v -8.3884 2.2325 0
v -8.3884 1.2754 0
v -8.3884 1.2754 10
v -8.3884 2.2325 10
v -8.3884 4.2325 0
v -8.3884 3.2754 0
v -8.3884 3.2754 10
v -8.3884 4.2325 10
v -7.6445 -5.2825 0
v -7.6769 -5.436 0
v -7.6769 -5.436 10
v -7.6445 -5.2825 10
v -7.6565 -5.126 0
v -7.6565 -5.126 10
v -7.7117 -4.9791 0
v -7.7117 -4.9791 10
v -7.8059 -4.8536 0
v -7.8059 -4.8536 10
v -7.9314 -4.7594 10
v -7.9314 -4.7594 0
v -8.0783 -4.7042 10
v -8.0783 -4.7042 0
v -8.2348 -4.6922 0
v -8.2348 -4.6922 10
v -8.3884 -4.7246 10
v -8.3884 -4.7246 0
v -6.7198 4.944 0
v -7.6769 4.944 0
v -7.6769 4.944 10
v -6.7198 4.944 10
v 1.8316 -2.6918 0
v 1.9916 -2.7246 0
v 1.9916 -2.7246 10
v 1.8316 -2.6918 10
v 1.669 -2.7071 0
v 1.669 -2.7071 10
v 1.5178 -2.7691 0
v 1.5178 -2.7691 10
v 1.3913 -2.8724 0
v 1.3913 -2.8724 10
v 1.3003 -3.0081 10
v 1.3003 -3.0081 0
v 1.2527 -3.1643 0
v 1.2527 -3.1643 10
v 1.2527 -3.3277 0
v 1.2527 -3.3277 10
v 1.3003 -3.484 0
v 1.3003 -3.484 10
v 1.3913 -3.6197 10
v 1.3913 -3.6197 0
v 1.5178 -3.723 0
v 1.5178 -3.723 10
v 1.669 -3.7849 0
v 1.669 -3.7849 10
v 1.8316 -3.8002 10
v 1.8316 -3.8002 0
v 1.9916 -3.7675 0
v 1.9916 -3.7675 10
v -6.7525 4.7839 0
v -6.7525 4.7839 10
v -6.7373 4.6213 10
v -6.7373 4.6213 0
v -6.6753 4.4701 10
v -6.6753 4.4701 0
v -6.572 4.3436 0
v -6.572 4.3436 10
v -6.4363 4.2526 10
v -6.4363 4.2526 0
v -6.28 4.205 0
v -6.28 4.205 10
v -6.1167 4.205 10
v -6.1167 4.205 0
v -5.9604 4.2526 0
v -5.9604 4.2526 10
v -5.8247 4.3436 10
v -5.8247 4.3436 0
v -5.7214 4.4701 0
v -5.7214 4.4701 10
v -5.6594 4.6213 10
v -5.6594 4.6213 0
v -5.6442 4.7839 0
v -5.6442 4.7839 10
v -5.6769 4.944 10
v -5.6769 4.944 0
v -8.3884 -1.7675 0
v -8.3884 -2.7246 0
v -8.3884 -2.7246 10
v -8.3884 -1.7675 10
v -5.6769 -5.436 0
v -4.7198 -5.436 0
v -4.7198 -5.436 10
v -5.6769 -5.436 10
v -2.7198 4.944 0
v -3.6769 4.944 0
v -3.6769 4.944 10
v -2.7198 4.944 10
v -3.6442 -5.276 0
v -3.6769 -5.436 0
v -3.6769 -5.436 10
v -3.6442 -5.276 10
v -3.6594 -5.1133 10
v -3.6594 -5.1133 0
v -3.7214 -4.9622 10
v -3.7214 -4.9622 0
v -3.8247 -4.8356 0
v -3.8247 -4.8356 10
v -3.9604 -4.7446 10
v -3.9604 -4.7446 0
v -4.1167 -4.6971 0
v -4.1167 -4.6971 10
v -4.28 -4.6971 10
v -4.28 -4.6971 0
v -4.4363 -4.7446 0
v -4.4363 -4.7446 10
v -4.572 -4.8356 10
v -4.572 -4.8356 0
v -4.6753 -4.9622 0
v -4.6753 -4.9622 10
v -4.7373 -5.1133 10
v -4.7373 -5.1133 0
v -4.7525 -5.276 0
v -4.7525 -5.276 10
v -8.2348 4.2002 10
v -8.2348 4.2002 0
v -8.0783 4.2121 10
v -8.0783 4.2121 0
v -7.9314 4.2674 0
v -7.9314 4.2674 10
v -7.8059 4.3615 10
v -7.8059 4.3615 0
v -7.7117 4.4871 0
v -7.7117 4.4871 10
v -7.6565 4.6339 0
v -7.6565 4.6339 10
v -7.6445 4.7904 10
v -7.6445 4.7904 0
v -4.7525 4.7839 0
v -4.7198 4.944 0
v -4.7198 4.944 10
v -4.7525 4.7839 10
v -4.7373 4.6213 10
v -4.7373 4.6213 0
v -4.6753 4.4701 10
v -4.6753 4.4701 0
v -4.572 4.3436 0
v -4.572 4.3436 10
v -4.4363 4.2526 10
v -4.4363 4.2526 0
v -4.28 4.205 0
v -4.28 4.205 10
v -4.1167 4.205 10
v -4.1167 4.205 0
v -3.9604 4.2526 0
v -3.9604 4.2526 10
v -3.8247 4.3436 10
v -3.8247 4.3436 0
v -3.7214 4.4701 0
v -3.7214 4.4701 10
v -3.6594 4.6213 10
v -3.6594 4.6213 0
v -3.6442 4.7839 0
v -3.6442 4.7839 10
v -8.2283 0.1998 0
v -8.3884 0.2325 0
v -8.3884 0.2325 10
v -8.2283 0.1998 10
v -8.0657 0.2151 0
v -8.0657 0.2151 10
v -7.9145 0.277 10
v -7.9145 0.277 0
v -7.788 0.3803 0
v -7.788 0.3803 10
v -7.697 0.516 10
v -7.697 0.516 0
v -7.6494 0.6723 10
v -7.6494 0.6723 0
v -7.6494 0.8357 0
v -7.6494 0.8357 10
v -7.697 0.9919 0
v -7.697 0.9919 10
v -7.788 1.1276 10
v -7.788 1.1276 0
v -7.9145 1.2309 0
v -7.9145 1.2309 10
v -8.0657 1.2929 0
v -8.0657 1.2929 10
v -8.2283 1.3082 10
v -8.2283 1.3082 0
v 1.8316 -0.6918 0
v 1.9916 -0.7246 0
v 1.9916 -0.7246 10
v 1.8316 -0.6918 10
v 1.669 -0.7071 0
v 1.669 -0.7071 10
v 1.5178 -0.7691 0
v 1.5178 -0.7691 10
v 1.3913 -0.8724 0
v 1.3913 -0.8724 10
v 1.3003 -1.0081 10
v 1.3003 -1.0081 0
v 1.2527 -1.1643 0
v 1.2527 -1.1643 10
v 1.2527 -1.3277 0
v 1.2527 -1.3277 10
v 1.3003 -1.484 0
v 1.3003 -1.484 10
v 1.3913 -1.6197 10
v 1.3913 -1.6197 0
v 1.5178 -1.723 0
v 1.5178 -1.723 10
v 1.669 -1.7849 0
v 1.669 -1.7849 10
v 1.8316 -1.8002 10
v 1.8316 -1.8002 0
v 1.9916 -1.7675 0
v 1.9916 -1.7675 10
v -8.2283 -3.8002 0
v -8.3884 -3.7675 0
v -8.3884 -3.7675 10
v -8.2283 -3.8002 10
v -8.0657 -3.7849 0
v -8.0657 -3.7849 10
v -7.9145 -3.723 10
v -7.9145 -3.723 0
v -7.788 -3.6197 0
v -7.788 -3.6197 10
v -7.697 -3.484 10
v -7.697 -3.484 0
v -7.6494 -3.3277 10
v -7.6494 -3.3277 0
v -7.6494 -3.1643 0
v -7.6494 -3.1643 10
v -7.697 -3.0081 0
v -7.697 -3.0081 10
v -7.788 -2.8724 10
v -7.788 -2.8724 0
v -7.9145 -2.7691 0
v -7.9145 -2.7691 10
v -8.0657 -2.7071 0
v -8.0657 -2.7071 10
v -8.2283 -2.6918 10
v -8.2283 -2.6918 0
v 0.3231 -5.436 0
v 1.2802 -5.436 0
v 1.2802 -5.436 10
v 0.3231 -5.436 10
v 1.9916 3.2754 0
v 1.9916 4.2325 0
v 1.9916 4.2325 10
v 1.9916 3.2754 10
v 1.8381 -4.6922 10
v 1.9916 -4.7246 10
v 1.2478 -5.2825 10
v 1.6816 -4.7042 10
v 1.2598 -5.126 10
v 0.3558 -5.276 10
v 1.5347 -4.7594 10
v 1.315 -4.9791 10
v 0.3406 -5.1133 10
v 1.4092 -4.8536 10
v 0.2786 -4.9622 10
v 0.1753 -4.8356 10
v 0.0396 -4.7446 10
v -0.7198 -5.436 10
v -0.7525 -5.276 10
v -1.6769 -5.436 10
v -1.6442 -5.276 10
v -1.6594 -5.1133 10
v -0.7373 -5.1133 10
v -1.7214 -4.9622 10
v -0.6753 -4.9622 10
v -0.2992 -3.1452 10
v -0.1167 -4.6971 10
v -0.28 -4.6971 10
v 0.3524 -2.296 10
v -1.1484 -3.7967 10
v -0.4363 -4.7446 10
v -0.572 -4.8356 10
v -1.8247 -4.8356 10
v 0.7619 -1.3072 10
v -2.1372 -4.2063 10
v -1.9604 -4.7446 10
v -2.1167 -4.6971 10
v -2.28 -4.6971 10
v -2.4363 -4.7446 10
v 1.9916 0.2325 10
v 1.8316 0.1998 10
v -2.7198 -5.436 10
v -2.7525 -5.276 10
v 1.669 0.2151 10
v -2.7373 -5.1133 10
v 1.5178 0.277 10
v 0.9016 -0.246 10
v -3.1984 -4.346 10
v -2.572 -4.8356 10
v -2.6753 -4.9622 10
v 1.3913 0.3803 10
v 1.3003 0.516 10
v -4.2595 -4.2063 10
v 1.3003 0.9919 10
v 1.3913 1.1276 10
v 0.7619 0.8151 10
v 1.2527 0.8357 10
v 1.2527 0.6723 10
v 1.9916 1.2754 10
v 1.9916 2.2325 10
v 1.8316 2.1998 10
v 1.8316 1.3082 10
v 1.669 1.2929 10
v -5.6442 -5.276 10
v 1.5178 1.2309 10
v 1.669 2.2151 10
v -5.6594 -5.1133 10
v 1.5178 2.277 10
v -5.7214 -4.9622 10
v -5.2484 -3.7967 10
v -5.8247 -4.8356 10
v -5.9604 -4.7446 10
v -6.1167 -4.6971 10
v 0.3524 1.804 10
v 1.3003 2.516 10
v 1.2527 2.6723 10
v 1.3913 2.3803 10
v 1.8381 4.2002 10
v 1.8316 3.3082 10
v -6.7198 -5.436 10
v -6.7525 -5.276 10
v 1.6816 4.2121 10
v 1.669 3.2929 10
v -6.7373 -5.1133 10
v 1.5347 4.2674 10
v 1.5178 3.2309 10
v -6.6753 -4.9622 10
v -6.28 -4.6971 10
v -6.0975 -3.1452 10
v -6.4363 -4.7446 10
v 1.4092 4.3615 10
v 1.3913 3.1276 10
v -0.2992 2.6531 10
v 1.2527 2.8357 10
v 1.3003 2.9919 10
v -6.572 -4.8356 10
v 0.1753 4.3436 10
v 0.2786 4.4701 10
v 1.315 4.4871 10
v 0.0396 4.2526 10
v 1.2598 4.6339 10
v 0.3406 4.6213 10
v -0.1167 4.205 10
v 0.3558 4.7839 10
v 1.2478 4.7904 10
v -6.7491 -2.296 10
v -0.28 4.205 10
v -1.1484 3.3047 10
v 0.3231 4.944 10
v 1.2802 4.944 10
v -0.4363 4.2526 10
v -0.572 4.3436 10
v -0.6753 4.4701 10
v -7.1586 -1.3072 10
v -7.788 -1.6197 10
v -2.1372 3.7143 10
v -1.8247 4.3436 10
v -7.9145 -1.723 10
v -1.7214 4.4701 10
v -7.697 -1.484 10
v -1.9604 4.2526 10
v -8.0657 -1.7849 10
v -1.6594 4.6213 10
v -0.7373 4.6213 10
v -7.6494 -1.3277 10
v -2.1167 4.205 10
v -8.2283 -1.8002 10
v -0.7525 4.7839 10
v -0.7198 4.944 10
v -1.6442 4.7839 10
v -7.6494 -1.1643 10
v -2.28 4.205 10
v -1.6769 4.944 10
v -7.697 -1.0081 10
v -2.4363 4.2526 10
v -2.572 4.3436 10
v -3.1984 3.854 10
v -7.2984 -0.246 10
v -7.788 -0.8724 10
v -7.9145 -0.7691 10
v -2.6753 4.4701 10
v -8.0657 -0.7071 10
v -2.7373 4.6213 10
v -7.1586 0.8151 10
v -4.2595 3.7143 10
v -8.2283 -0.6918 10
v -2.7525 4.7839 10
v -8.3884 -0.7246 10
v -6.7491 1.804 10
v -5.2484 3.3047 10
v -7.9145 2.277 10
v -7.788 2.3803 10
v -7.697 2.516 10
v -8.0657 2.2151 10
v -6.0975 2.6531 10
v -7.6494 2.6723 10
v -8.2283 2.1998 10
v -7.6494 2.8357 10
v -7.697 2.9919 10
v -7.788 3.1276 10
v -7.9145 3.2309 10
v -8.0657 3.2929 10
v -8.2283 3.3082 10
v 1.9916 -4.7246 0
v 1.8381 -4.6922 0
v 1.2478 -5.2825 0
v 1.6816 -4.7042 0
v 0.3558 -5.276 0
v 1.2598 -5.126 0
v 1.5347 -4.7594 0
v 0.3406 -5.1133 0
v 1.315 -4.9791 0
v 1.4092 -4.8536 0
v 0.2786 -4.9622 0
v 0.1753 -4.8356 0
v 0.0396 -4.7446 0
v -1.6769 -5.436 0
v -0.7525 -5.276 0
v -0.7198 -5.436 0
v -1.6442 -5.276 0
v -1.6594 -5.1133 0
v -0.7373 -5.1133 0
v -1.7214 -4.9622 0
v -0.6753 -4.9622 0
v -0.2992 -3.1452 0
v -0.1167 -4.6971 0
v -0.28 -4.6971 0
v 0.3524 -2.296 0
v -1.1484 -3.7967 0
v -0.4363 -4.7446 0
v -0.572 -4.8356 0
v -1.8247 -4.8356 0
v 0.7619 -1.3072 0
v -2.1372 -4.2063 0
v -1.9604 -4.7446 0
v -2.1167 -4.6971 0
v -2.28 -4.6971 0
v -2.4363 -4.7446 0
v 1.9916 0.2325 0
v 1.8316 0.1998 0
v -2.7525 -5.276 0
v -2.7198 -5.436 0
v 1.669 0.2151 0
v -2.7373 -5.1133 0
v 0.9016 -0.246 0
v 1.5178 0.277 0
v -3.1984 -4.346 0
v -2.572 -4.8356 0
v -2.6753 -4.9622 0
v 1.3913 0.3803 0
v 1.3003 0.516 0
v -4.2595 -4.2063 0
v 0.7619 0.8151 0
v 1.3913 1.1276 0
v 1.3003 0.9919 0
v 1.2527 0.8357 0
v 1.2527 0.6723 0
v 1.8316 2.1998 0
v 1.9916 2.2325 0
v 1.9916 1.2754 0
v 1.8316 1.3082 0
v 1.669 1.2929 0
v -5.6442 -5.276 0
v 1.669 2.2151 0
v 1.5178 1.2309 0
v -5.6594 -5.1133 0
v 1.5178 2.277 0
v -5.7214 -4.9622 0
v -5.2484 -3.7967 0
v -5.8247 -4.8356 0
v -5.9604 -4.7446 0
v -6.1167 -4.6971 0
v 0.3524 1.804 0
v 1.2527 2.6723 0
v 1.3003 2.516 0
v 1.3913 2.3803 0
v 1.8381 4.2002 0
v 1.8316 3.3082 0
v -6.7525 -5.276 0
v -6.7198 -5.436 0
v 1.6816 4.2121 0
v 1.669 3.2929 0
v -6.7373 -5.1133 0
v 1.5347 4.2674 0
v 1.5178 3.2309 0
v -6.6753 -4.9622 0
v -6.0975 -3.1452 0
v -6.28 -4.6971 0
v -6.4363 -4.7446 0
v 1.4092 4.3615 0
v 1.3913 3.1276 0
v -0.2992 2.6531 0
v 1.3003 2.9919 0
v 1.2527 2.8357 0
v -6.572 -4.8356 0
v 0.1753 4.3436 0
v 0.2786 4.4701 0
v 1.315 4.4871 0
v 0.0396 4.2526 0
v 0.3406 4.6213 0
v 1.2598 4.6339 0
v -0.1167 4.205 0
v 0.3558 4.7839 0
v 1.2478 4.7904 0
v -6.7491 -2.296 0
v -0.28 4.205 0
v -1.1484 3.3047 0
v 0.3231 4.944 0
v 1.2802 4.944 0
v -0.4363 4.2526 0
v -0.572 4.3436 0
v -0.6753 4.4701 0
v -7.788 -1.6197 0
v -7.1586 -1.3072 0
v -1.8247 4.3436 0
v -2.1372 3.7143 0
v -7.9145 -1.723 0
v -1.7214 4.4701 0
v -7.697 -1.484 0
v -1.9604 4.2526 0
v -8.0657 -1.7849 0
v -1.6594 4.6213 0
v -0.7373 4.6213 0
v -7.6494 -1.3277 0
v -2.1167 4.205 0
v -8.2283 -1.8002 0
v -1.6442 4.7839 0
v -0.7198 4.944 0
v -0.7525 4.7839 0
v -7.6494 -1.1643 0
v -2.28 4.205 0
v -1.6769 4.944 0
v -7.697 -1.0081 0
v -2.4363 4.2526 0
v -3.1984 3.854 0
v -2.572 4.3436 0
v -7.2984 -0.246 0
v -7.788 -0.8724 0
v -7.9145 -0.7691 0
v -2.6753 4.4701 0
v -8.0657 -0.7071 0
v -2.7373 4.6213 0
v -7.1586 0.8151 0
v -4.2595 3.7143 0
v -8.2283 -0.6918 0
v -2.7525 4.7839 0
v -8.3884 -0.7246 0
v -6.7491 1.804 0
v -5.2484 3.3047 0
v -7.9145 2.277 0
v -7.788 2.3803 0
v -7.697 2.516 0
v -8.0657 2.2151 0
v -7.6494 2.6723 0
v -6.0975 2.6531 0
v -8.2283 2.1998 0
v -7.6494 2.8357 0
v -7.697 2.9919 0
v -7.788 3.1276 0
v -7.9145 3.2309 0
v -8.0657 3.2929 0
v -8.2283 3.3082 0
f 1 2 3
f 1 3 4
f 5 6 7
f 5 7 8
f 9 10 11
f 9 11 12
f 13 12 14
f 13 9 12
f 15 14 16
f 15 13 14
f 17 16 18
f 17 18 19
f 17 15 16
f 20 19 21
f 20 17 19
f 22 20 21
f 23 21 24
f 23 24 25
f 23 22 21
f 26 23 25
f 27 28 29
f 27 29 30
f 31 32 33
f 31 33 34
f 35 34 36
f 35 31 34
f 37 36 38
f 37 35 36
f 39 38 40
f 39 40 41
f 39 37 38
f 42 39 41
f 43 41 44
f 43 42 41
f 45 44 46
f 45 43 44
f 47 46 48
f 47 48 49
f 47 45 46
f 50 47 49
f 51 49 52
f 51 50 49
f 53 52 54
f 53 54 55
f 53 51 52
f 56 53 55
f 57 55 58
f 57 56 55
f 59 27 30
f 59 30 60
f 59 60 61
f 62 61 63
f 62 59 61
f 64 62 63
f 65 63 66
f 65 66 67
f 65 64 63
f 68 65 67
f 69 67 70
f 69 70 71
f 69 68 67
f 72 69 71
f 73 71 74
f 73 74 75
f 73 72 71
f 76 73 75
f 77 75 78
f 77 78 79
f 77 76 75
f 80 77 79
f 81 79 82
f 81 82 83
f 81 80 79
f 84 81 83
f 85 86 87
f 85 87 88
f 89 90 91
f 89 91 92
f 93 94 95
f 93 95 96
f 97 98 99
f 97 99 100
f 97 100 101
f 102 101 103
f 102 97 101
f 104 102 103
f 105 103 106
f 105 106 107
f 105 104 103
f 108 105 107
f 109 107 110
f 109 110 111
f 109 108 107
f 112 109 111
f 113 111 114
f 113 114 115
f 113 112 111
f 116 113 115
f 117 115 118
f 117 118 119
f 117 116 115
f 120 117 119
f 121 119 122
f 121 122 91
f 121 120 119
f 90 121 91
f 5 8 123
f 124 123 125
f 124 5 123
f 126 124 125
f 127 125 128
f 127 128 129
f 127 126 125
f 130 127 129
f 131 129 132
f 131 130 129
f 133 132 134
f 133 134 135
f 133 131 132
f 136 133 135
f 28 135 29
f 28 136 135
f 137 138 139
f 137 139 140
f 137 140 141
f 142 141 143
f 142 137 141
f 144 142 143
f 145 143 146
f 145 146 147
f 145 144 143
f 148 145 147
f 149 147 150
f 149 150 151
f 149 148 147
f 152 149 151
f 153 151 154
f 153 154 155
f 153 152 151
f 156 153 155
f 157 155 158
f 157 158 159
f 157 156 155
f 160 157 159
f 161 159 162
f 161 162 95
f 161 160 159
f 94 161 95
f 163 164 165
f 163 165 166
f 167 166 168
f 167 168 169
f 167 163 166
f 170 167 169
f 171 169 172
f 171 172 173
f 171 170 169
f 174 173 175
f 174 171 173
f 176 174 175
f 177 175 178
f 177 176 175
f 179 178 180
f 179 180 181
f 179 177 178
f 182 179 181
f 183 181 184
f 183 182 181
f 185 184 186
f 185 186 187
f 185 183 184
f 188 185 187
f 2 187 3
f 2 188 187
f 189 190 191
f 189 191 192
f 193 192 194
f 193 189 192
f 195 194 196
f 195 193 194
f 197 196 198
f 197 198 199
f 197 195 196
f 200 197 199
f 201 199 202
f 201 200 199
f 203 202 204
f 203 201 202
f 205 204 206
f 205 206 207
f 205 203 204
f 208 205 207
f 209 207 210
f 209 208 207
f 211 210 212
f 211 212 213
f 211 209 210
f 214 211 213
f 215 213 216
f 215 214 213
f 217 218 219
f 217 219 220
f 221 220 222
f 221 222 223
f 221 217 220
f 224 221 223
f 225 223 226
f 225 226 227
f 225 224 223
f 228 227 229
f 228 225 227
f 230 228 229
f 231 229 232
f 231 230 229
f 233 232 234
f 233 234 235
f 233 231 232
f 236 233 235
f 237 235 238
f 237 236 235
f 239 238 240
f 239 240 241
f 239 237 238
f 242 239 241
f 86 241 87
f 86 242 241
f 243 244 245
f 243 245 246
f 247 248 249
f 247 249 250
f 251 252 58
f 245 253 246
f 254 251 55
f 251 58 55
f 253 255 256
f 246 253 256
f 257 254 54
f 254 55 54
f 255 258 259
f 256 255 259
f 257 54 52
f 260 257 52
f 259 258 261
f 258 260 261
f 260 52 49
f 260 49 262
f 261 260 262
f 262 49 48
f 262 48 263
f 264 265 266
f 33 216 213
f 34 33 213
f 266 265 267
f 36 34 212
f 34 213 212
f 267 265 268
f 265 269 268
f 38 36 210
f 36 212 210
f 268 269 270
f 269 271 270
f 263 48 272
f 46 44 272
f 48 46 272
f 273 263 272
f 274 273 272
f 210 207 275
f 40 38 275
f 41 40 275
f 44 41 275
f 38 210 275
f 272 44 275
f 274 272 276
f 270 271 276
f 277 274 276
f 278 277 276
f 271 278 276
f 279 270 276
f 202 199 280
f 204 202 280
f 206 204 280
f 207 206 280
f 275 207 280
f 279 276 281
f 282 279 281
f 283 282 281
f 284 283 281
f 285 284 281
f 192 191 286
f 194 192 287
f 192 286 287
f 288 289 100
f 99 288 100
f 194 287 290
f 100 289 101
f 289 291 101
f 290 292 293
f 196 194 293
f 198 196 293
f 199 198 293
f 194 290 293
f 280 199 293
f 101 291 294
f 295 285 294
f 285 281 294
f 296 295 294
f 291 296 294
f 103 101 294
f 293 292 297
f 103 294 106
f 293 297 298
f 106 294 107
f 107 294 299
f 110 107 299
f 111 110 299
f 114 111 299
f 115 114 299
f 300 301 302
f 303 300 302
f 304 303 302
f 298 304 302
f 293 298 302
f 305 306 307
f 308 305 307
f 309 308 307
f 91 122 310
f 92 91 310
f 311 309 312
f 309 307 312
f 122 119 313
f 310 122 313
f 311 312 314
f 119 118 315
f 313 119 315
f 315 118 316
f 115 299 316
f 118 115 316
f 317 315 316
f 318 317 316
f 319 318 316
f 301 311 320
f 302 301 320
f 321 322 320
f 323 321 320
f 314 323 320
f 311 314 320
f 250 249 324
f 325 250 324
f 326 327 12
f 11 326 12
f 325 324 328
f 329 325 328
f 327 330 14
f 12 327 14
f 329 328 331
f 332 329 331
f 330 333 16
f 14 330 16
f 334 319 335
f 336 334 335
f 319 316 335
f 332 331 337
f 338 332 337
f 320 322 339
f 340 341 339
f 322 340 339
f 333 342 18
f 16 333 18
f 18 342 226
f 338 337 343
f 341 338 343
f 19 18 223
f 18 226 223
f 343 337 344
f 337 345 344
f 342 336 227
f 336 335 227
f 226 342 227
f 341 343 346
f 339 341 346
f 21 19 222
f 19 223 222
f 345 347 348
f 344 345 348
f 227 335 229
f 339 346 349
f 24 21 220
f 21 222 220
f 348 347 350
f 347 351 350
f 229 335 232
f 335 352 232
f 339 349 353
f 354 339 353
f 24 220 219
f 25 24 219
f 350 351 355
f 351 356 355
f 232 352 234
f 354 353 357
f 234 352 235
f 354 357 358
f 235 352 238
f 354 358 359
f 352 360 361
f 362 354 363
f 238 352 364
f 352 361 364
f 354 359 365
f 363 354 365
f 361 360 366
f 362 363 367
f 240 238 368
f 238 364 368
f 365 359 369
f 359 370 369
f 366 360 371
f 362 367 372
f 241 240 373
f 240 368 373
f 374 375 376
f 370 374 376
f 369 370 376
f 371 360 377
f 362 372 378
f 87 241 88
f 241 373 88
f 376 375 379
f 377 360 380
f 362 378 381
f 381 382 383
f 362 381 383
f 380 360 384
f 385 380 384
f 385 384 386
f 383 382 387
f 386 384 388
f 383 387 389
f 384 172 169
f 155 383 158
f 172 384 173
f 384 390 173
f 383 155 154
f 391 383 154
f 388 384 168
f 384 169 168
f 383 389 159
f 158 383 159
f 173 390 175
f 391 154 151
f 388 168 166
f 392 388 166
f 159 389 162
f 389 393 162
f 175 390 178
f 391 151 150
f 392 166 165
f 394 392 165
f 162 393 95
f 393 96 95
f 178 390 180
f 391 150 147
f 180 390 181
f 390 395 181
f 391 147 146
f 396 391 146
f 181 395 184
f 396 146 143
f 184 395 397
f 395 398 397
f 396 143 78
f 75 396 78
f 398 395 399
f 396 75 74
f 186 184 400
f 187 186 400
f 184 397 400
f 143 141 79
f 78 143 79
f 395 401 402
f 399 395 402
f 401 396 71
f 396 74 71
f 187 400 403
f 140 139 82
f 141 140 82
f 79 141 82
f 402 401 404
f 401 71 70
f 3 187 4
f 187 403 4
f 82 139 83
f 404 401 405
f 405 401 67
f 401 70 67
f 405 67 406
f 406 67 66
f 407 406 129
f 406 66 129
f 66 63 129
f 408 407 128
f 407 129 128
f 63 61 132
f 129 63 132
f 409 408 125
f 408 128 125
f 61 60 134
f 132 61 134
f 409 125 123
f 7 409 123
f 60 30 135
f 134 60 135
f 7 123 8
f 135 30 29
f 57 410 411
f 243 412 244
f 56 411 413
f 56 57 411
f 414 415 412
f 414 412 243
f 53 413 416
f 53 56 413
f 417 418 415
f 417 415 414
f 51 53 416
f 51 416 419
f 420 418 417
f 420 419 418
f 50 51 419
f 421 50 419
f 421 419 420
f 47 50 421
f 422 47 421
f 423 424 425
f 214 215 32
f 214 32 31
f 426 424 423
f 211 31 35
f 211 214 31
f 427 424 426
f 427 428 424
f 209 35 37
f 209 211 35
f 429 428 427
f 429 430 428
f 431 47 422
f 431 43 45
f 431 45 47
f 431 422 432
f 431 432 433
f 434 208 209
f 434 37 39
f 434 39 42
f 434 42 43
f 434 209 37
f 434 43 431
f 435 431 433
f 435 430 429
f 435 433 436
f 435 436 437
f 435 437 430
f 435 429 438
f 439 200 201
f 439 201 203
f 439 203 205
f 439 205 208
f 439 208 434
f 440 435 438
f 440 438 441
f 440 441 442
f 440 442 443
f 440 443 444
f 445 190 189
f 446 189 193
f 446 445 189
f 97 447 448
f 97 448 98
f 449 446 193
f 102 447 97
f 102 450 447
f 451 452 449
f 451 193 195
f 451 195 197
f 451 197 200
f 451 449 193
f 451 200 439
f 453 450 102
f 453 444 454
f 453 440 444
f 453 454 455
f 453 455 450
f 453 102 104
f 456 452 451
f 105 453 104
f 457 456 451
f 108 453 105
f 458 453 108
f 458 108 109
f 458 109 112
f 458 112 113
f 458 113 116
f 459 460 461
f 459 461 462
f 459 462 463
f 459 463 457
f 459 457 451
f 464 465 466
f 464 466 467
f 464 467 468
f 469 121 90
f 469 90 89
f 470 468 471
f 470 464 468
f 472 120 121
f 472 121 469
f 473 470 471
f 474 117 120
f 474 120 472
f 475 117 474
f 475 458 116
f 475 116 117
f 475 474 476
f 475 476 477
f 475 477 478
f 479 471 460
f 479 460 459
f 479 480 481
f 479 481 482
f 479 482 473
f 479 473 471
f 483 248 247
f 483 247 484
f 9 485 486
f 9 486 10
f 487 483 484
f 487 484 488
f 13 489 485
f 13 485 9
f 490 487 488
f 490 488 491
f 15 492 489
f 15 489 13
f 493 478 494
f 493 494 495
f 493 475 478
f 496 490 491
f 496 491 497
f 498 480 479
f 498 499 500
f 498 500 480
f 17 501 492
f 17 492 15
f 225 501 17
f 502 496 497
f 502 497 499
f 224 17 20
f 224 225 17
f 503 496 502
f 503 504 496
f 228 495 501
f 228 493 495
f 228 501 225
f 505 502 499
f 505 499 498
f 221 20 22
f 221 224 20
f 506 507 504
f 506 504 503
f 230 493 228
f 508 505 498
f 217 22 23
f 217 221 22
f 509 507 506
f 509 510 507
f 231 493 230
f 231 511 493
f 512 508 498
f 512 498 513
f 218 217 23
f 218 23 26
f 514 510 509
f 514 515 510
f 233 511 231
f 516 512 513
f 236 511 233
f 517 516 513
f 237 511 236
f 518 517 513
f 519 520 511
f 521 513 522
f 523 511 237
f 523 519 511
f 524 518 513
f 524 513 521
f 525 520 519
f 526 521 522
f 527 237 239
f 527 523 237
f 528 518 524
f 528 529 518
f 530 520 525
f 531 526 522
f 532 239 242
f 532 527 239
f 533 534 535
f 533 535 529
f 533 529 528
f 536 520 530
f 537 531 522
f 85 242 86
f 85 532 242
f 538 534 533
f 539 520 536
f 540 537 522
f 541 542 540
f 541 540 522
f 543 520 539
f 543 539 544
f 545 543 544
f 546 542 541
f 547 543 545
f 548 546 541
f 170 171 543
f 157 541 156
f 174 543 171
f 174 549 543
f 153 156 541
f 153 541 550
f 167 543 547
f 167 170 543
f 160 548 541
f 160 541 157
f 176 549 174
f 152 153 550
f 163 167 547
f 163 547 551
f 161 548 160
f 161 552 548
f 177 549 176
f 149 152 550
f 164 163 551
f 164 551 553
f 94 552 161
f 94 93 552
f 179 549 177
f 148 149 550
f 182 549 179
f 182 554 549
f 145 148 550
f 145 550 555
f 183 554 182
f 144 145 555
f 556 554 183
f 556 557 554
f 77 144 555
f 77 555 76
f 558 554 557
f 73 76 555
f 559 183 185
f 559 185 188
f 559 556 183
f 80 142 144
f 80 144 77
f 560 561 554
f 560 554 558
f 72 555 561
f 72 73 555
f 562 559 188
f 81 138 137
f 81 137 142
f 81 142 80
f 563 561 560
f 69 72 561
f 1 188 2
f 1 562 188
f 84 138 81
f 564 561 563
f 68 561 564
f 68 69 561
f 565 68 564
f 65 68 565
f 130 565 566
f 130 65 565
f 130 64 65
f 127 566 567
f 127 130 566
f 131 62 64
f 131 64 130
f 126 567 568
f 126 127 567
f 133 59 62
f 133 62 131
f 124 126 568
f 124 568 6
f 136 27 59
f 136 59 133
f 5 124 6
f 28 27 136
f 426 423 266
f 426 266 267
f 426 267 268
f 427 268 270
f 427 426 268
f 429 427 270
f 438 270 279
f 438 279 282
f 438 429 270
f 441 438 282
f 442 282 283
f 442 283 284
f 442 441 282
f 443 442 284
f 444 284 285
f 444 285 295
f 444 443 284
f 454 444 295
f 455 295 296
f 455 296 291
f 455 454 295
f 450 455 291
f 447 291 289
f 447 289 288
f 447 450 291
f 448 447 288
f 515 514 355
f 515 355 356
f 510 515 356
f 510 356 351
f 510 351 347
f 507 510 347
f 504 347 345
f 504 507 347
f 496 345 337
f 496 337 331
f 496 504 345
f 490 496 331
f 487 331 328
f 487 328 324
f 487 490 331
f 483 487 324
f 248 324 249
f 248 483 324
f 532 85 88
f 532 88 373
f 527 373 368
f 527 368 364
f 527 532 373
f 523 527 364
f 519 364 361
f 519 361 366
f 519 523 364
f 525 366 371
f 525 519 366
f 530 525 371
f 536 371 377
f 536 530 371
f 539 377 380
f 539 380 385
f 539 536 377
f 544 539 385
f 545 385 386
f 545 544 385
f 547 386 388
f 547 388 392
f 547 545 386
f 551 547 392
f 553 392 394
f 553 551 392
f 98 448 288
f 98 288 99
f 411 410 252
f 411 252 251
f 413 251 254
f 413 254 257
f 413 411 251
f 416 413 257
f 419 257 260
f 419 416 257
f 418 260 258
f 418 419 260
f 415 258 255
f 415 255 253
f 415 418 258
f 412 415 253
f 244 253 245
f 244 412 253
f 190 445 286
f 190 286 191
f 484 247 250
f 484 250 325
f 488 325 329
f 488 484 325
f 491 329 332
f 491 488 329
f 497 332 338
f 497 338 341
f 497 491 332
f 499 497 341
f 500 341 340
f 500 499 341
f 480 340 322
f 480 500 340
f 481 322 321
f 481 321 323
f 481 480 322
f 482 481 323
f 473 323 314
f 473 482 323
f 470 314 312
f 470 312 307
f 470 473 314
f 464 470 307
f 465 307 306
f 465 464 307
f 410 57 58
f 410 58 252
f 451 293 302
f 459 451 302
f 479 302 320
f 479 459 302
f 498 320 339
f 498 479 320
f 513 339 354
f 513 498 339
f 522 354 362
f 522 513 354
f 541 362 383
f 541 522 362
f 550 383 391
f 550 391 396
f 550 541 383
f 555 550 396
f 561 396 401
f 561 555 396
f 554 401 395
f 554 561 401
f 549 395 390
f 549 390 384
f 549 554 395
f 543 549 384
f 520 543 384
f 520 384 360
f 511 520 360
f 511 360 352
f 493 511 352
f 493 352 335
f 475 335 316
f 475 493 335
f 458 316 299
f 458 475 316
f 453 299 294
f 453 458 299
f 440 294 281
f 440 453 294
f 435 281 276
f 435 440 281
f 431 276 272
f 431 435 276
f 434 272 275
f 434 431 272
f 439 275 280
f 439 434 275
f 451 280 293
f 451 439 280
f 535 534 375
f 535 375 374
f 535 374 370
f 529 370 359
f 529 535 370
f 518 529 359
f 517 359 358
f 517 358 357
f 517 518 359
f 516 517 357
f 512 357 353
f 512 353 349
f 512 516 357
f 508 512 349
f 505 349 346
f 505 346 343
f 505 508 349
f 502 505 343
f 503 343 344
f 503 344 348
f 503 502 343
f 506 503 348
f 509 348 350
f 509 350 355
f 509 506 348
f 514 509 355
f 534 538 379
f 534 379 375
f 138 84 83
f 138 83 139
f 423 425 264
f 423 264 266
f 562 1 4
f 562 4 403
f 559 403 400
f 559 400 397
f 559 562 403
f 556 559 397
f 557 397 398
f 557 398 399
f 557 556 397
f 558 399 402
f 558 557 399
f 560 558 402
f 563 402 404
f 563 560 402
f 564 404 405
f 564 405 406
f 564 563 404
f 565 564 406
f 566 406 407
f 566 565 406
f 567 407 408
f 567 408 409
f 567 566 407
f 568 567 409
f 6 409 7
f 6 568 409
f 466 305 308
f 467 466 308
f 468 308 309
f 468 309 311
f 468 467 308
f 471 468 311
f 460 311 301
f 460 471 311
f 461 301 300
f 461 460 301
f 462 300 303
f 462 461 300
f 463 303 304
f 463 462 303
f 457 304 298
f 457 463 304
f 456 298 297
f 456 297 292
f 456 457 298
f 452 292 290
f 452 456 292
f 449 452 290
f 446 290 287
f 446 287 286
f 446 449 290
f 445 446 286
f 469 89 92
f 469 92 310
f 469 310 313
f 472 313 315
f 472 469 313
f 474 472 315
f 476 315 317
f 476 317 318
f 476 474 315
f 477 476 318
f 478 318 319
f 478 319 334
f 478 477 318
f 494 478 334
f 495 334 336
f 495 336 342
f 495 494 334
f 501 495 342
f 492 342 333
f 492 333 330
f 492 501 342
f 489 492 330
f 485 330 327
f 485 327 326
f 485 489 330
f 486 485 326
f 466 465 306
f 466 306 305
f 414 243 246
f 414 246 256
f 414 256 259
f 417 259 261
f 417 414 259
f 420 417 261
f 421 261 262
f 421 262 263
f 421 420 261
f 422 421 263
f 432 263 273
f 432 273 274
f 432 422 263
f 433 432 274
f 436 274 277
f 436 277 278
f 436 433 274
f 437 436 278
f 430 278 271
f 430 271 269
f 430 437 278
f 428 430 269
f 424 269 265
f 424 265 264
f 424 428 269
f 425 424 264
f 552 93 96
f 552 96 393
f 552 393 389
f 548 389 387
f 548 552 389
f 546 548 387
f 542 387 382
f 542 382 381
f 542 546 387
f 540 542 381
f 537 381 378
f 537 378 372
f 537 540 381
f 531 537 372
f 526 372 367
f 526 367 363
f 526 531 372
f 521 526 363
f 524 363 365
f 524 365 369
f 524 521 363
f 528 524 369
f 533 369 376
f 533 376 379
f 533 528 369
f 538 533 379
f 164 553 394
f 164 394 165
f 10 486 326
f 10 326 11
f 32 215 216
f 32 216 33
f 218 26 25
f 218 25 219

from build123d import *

# Parameters (mm, degrees)
SKETCH2_R           = 4.1
BOSS_EXTRUDE2_DEPTH = 10


with BuildPart() as part:
    # Sketch2 → Boss-Extrude2 (new body)
    with BuildSketch(Plane.XY):
        with BuildLine():
            ThreePointArc((-8.388352144, 2.232508627), (-7.643352144, 2.753972912), (-8.388352144, 3.275437196))
            Line((-8.388352144, 3.275437196), (-8.388352144, 4.232508627))
            ThreePointArc((-8.388352144, 4.232508627), (-7.805907881, 4.361528648), (-7.67688786, 4.943972912))
            Line((-7.67688786, 4.943972912), (-6.719816429, 4.943972912))
            ThreePointArc((-6.719816429, 4.943972912), (-6.198352144, 4.198972912), (-5.67688786, 4.943972912))
            Line((-5.67688786, 4.943972912), (-4.719816429, 4.943972912))
            ThreePointArc((-4.719816429, 4.943972912), (-4.198352144, 4.198972912), (-3.67688786, 4.943972912))
            Line((-3.67688786, 4.943972912), (-2.719816429, 4.943972912))
            ThreePointArc((-2.719816429, 4.943972912), (-2.198352144, 4.198972912), (-1.67688786, 4.943972912))
            Line((-1.67688786, 4.943972912), (-0.719816429, 4.943972912))
            ThreePointArc((-0.719816429, 4.943972912), (-0.198352144, 4.198972912), (0.32311214, 4.943972912))
            Line((0.32311214, 4.943972912), (1.280183571, 4.943972912))
            ThreePointArc((1.280183571, 4.943972912), (1.409203592, 4.361528648), (1.991647856, 4.232508627))
            Line((1.991647856, 4.232508627), (1.991647856, 3.275437196))
            ThreePointArc((1.991647856, 3.275437196), (1.246647856, 2.753972912), (1.991647856, 2.232508627))
            Line((1.991647856, 2.232508627), (1.991647856, 1.275437196))
            ThreePointArc((1.991647856, 1.275437196), (1.246647856, 0.753972912), (1.991647856, 0.232508627))
            Line((1.991647856, 0.232508627), (1.991647856, -0.724562804))
            ThreePointArc((1.991647856, -0.724562804), (1.246647856, -1.246027088), (1.991647856, -1.767491373))
            Line((1.991647856, -1.767491373), (1.991647856, -2.724562804))
            ThreePointArc((1.991647856, -2.724562804), (1.246647856, -3.246027088), (1.991647856, -3.767491373))
            Line((1.991647856, -3.767491373), (1.991647856, -4.724562804))
            ThreePointArc((1.991647856, -4.724562804), (1.409203592, -4.853582824), (1.280183571, -5.436027088))
            Line((1.280183571, -5.436027088), (0.32311214, -5.436027088))
            ThreePointArc((0.32311214, -5.436027088), (-0.198352144, -4.691027088), (-0.719816429, -5.436027088))
            Line((-0.719816429, -5.436027088), (-1.67688786, -5.436027088))
            ThreePointArc((-1.67688786, -5.436027088), (-2.198352144, -4.691027088), (-2.719816429, -5.436027088))
            Line((-2.719816429, -5.436027088), (-3.67688786, -5.436027088))
            ThreePointArc((-3.67688786, -5.436027088), (-4.198352144, -4.691027088), (-4.719816429, -5.436027088))
            Line((-4.719816429, -5.436027088), (-5.67688786, -5.436027088))
            ThreePointArc((-5.67688786, -5.436027088), (-6.198352144, -4.691027088), (-6.719816429, -5.436027088))
            Line((-6.719816429, -5.436027088), (-7.67688786, -5.436027088))
            ThreePointArc((-7.67688786, -5.436027088), (-7.805907881, -4.853582824), (-8.388352144, -4.724562804))
            Line((-8.388352144, -4.724562804), (-8.388352144, -3.767491373))
            ThreePointArc((-8.388352144, -3.767491373), (-7.643352144, -3.246027088), (-8.388352144, -2.724562804))
            Line((-8.388352144, -2.724562804), (-8.388352144, -1.767491373))
            ThreePointArc((-8.388352144, -1.767491373), (-7.643352144, -1.246027088), (-8.388352144, -0.724562804))
            Line((-8.388352144, -0.724562804), (-8.388352144, 0.232508627))
            ThreePointArc((-8.388352144, 0.232508627), (-7.643352144, 0.753972912), (-8.388352144, 1.275437196))
            Line((-8.388352144, 1.275437196), (-8.388352144, 2.232508627))
        make_face()
        with Locations((-3.198352144, -0.246027088)):
            Circle(SKETCH2_R, mode=Mode.SUBTRACT)
    extrude(amount=BOSS_EXTRUDE2_DEPTH)


solid = part.part
